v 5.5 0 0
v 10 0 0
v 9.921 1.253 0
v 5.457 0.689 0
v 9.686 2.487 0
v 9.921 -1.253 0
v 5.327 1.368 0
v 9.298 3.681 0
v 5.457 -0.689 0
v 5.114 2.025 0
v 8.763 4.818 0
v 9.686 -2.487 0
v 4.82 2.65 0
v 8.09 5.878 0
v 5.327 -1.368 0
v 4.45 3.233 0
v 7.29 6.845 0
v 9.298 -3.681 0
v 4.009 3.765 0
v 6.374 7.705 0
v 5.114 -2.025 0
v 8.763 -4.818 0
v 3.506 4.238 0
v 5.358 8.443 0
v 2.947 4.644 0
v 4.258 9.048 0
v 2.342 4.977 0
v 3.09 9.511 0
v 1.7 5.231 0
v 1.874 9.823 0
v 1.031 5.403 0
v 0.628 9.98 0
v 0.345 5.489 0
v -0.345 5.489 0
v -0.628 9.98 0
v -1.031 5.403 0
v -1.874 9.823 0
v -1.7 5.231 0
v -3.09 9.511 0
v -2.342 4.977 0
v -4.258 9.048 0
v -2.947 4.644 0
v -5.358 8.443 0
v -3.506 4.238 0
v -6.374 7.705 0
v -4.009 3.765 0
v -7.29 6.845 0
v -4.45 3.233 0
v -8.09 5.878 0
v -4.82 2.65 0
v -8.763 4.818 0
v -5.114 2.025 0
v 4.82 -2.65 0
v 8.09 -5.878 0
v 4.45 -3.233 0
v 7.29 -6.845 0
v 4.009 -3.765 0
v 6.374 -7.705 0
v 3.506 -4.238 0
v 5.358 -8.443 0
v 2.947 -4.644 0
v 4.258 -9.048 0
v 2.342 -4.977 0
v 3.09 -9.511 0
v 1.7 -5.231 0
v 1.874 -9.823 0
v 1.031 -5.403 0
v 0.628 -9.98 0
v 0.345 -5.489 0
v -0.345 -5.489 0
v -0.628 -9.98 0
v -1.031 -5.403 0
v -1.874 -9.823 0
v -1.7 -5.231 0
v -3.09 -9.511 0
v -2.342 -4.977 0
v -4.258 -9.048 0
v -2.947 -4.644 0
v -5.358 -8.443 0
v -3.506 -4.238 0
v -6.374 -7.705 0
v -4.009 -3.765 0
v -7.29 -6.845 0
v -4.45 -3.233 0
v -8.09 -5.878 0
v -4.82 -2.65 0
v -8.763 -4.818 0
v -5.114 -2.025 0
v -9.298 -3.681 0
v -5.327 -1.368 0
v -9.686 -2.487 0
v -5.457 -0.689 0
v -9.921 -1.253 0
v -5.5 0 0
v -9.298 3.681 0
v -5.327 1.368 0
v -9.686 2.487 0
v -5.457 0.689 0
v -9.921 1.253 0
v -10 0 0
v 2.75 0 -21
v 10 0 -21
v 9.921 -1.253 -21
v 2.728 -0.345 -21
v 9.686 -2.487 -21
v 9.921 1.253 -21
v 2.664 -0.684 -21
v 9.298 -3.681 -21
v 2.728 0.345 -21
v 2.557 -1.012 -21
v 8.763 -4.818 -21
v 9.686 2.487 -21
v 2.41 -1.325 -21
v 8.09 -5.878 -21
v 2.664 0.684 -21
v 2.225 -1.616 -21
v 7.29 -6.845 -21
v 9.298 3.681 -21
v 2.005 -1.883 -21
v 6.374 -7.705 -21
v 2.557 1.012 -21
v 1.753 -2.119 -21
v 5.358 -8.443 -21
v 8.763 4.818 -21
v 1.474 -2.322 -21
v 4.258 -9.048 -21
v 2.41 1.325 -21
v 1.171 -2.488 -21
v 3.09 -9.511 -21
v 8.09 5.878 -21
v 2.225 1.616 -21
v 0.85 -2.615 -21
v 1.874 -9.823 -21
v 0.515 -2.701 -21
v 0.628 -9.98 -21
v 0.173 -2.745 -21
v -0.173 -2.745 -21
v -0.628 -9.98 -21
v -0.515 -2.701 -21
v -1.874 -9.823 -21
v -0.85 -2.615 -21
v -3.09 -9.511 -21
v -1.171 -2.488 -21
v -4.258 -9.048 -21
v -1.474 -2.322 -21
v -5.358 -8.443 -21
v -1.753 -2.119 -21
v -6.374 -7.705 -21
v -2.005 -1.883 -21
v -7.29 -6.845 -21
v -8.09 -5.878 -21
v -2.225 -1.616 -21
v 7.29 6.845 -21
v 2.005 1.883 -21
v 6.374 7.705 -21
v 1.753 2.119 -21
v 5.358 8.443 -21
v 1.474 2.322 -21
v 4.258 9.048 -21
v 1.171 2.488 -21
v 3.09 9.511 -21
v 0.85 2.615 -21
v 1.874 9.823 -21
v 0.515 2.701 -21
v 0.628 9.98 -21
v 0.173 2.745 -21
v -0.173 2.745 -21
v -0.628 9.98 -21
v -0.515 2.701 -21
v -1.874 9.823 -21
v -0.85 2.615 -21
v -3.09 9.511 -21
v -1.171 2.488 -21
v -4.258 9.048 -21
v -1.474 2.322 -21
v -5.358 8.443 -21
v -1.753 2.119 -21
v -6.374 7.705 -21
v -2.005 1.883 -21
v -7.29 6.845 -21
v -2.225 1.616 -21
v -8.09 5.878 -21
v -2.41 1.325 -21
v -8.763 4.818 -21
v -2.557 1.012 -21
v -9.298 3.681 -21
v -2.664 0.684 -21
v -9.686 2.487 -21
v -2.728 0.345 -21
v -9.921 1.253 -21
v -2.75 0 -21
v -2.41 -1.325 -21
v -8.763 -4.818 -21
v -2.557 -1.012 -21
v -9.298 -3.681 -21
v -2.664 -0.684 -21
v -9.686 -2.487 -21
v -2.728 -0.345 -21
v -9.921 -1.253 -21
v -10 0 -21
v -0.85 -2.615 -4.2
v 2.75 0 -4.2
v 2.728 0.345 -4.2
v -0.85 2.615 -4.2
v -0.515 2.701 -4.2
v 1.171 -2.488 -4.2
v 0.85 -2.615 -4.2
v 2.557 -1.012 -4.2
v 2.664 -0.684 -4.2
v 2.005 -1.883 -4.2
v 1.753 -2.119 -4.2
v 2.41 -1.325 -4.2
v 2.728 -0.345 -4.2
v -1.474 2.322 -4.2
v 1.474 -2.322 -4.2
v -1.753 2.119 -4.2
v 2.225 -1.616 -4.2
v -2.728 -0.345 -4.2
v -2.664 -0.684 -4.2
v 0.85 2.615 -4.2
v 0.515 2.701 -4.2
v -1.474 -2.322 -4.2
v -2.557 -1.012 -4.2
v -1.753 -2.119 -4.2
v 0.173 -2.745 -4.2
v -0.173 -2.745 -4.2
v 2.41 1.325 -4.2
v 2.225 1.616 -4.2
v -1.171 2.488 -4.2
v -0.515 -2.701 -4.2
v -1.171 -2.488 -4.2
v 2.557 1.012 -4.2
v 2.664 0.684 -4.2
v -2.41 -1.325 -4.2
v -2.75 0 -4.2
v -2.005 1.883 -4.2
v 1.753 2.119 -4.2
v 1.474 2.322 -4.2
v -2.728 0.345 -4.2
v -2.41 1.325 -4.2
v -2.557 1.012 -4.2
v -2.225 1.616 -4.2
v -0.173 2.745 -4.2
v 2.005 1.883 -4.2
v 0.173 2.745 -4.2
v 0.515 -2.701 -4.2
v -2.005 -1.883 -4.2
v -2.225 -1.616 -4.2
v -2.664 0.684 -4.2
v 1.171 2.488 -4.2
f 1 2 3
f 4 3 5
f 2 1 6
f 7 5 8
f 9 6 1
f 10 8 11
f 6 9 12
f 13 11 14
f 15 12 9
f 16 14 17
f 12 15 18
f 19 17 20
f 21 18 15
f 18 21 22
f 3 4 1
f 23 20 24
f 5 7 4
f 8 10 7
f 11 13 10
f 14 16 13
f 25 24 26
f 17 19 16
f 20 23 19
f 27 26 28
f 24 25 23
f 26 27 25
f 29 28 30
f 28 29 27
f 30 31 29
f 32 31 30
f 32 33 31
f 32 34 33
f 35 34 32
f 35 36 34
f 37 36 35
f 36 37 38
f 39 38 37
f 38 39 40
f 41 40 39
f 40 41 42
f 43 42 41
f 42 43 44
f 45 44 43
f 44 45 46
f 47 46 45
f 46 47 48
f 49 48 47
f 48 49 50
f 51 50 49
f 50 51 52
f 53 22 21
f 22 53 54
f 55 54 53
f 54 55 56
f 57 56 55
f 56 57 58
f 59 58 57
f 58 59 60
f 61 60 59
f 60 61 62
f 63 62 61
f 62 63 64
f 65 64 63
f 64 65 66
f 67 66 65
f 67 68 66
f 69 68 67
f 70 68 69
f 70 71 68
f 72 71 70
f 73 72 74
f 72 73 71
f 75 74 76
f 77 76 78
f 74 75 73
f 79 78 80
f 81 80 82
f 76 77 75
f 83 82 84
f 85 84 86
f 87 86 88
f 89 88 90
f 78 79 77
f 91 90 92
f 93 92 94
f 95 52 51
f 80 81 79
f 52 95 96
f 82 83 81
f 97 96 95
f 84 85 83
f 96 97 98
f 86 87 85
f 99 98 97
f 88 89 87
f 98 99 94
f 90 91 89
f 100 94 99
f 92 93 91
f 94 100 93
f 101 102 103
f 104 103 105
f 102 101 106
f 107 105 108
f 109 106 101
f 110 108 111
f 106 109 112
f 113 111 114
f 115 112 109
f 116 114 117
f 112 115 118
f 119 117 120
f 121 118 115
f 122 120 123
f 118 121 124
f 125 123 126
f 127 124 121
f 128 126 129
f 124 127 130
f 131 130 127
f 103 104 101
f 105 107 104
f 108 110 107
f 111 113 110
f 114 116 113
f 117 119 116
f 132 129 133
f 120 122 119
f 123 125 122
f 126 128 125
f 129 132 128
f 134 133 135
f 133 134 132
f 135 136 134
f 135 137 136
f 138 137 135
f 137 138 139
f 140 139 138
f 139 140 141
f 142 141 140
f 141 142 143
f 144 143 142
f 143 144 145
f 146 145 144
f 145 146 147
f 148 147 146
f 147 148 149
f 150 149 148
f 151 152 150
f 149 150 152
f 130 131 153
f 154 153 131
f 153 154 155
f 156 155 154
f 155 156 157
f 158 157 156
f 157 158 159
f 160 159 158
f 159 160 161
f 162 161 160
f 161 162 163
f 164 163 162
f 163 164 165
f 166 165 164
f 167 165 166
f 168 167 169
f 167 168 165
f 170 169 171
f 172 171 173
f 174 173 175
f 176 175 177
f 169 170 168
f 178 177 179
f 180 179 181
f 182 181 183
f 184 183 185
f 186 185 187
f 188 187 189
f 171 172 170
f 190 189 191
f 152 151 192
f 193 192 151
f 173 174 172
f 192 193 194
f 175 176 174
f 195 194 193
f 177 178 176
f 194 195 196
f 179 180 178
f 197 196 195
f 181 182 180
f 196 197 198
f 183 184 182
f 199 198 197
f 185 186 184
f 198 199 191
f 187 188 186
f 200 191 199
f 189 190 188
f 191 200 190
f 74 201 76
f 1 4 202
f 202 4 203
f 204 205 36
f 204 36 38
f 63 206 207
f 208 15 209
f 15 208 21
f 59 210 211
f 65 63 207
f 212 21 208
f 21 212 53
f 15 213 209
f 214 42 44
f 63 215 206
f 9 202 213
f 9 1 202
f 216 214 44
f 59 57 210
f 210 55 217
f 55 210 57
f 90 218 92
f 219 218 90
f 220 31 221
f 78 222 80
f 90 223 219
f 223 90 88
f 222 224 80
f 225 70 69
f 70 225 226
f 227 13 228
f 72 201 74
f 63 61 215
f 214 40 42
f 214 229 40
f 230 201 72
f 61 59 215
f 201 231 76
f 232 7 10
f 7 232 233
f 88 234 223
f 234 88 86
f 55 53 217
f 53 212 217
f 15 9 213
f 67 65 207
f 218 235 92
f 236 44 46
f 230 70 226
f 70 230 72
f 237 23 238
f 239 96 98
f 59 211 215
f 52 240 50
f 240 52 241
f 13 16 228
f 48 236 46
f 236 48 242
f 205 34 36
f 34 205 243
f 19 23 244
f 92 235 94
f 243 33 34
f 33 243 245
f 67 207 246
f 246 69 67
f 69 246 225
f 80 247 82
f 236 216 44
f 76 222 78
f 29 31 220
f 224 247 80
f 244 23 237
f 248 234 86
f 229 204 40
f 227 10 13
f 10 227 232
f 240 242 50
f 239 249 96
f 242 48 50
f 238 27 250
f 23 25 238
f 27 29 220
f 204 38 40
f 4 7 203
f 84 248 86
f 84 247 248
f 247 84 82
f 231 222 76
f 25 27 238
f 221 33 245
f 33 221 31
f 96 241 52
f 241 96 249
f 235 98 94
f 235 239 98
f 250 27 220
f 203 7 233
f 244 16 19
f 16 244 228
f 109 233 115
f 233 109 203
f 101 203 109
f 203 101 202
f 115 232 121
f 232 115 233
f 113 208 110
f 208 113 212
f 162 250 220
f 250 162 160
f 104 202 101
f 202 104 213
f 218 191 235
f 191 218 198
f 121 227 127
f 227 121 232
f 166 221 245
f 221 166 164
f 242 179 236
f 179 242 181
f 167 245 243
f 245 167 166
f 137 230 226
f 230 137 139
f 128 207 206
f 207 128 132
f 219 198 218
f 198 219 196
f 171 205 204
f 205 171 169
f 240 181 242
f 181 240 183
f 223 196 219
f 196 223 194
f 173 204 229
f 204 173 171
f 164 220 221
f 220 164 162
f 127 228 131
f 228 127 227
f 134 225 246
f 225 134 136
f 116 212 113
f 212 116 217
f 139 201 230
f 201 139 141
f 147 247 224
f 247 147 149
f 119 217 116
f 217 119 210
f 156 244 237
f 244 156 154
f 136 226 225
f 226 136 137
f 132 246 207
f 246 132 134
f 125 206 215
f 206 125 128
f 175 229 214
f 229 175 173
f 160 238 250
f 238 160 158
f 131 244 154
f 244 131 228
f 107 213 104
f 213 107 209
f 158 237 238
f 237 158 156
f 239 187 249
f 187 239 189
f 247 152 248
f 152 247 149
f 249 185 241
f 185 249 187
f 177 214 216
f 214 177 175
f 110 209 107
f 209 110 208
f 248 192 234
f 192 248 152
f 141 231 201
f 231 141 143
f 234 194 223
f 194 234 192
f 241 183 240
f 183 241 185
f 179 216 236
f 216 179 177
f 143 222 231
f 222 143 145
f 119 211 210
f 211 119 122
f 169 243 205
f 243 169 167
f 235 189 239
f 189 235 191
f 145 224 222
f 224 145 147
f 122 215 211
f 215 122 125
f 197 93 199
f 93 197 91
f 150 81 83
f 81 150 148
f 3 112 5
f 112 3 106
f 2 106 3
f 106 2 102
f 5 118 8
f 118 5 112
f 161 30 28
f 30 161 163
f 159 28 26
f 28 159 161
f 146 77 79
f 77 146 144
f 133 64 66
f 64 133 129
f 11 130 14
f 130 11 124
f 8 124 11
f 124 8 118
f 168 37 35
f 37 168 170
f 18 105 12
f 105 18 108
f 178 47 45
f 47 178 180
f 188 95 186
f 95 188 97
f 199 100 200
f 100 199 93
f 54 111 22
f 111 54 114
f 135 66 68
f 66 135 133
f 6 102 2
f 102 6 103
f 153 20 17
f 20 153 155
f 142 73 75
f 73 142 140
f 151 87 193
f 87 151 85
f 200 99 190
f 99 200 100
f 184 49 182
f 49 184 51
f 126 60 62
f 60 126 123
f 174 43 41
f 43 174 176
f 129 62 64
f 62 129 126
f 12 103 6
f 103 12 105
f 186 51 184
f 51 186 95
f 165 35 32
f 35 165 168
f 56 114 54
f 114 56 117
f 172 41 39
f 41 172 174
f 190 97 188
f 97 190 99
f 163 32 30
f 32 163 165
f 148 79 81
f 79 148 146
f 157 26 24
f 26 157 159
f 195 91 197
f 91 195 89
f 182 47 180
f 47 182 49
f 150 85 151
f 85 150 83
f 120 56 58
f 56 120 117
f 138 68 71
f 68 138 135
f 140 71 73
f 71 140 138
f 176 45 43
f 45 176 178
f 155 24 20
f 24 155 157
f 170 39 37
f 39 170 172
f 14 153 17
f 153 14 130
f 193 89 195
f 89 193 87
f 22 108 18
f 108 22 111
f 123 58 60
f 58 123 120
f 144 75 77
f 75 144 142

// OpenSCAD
$fn = 50;


difference() {
	union() {
		translate(v = [0, 0, -21.0000000000]) {
			cylinder(h = 21, r = 10.0000000000);
		}
		cylinder(h = 0, r = 13.0000000000);
	}
	union() {
		translate(v = [0, 0, 0]) {
			rotate(a = [0, 0, 0]) {
				difference() {
					union() {
						#translate(v = [0, 0, -21.0000000000]) {
							cylinder(h = 21, r = 2.2500000000);
						}
						#translate(v = [0, 0, -4.2000000000]) {
							cylinder(h = 4.2000000000, r1 = 2.7500000000, r2 = 5.5000000000);
						}
						#translate(v = [0, 0, -21.0000000000]) {
							cylinder(h = 21, r = 2.7500000000);
						}
						#translate(v = [0, 0, -21.0000000000]) {
							cylinder(h = 21, r = 2.2500000000);
						}
					}
					union();
				}
			}
		}
	}
}
